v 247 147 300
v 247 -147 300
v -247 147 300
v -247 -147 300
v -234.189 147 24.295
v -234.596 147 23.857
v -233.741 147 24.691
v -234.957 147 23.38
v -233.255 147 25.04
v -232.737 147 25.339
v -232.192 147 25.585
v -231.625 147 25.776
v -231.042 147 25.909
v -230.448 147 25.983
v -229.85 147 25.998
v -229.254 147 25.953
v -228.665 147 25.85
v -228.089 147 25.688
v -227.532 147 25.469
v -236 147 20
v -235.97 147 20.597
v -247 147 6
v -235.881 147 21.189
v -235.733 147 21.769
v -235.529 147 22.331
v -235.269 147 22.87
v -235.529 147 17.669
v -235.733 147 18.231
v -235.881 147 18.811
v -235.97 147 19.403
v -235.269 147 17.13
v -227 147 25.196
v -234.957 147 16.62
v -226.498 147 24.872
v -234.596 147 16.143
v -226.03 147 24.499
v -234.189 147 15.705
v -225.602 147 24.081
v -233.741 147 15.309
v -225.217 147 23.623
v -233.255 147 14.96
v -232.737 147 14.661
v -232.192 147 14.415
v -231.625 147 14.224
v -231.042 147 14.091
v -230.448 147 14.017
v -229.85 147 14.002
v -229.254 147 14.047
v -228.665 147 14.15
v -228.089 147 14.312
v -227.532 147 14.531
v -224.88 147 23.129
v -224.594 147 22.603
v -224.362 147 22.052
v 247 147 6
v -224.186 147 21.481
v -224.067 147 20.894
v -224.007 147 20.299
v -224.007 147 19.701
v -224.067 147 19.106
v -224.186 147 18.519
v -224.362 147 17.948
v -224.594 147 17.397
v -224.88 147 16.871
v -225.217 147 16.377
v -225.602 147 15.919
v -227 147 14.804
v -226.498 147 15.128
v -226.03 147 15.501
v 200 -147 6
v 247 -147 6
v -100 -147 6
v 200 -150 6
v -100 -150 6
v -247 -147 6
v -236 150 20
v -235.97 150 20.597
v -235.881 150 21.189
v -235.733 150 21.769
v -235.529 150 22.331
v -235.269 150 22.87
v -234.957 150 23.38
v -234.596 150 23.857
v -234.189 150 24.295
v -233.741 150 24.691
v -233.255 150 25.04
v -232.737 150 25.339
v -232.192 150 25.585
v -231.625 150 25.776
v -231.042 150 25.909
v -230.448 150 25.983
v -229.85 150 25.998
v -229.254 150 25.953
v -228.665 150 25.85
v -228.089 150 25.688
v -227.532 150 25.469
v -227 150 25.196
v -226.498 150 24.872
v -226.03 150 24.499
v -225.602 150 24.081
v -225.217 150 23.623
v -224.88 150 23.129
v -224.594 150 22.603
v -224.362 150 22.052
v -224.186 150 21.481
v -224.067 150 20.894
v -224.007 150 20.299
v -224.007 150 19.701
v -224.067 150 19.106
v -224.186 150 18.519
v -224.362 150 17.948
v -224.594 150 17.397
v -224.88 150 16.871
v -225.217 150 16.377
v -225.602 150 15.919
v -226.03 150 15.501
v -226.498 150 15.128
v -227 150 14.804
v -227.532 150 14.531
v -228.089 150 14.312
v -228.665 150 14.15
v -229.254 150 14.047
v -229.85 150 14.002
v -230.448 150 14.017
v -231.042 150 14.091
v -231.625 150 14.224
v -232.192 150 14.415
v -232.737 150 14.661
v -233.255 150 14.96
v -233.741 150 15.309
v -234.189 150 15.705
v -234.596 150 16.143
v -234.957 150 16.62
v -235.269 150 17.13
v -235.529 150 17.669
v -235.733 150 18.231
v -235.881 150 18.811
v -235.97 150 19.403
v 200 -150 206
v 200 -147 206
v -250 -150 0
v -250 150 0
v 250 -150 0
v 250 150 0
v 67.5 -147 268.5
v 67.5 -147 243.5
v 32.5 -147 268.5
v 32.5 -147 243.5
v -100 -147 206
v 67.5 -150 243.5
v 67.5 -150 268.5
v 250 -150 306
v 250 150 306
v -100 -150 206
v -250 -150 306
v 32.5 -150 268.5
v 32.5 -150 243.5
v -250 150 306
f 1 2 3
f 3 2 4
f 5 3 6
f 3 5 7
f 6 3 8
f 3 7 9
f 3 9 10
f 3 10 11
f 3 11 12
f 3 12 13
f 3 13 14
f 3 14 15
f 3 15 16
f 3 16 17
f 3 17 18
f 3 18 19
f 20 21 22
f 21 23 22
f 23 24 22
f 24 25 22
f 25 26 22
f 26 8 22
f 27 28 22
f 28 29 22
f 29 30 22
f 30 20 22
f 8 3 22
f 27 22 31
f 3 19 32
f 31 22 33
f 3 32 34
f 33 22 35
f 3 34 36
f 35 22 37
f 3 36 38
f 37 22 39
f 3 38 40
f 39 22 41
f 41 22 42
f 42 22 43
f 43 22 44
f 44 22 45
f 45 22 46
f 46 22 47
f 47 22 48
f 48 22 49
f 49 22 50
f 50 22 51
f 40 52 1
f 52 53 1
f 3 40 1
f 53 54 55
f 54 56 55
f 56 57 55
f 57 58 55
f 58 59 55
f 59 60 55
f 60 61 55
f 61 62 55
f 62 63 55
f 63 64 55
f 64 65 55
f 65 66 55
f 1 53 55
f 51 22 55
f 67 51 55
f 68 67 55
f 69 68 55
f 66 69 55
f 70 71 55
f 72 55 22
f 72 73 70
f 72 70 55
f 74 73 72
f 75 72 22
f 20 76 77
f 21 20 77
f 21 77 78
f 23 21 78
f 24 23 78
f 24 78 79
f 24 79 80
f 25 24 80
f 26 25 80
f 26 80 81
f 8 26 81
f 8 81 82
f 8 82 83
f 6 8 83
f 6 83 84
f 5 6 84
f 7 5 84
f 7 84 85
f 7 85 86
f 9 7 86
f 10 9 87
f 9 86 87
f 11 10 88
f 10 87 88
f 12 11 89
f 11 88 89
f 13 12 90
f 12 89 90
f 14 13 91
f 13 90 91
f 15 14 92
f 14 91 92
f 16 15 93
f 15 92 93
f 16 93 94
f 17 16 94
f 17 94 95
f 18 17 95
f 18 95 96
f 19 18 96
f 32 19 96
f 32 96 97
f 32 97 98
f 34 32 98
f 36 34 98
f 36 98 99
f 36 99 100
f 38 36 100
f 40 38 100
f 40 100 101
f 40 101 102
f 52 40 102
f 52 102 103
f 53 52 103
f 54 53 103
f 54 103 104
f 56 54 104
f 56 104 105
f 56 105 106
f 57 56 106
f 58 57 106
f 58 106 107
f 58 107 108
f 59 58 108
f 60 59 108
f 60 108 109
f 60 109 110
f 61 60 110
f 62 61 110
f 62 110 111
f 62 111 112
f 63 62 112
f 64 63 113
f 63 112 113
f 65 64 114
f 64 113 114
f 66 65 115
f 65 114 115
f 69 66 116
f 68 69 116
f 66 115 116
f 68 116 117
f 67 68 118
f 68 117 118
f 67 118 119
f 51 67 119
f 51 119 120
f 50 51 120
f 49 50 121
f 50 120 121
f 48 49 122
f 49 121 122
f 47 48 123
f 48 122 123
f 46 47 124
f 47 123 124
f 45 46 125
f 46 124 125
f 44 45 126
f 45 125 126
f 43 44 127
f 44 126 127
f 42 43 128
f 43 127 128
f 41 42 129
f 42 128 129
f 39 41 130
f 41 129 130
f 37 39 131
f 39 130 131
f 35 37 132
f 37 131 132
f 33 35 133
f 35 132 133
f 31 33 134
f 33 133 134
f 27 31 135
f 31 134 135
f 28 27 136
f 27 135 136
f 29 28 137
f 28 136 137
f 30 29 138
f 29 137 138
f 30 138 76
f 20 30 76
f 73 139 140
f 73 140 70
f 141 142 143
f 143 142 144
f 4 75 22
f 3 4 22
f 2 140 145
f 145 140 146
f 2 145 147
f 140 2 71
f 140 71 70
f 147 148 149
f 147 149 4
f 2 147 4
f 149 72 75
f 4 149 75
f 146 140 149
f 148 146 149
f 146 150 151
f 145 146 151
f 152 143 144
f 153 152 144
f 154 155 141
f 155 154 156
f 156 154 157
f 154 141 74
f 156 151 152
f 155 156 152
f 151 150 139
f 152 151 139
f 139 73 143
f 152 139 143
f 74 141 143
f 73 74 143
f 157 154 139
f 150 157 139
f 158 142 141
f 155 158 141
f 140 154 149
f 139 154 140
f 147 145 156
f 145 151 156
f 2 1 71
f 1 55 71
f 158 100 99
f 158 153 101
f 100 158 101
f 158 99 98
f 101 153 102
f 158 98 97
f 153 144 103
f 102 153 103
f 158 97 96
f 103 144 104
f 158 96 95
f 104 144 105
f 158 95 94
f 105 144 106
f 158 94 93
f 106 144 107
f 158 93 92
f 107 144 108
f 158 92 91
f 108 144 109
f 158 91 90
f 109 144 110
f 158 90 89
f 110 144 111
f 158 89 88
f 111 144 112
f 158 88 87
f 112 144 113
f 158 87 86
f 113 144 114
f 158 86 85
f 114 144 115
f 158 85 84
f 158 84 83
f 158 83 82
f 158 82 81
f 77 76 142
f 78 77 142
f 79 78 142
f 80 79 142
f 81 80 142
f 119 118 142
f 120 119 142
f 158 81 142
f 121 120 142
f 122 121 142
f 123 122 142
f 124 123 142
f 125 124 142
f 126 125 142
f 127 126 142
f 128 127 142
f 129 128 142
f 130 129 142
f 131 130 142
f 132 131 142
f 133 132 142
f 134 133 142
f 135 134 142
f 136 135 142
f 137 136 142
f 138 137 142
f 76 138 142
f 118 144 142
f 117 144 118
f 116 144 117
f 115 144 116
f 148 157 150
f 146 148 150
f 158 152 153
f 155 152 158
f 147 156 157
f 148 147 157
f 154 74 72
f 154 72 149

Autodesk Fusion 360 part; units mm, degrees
sketch "Onderkant" plane through (0, 0, 0) normal (0, 0, 1) x (1, 0, 0)
  line L0 (250, 150) -> (-250, 150)
  line L1 (-250, 150) -> (-250, -150)
  line L2 (-250, -150) -> (250, -150)
  line L3 (250, -150) -> (250, 150)
  line L4 (250, 150) -> (-250, -150) construction
  line L5 (-250, 150) -> (250, -150) construction
  dimension "d29" = 500
  dimension "d30" = 300
extrude "Extrude7" add sketch "Onderkant" along normal blind 6
sketch "Zijkanten" plane through (0, 0, 6) normal (0, 0, 1) x (-1, 0, 0)
  line L0 (-250, 150) -> (-250, -150)
  line L1 (-250, -150) -> (250, -150)
  line L2 (250, -150) -> (250, 150)
  line L3 (250, 150) -> (-250, 150)
  line L4 (-247, 147) -> (247, 147)
  line L5 (247, 147) -> (247, -147)
  line L6 (247, -147) -> (-247, -147)
  line L7 (-247, -147) -> (-247, 147)
  line L8 (-247, 147) -> (247, -147) construction
  line L9 (247, 147) -> (-247, -147) construction
  dimension "d33" = 494
  dimension "d34" = 294
extrude "Extrude8" add sketch "Zijkanten" along normal blind 300
sketch "Bovenkant" plane through (0, 0, 306) normal (0, 0, 1) x (-1, 0, 0)
  line L0 (247, -147) -> (-247, -147)
  line L1 (-247, -147) -> (-247, 147)
  line L2 (-247, 147) -> (247, 147)
  line L3 (247, 147) -> (247, -147)
  line L4 (250, 150) -> (-250, 150)
  line L5 (-250, 150) -> (-250, -150)
  line L6 (-250, -150) -> (250, -150)
  line L7 (250, -150) -> (250, 150)
  line L8 (-250, 150) -> (250, 150)
  line L9 (250, 150) -> (250, -150)
  line L10 (250, -150) -> (-250, -150)
  line L11 (-250, -150) -> (-250, 150)
  line L12 (-250, 150) -> (250, -150) construction
  line L13 (250, 150) -> (-250, -150) construction
  dimension "d37" = 500
  dimension "d38" = 300
extrude "Extrude9" add sketch "Bovenkant" against normal blind 6 contours L0 L1 L2 L3
sketch "Deur" plane through (0, -150, 0) normal (0, -1, 0) x (1, 0, 0)
  line L0 (-250, 0) -> (250, 0)
  line L1 (250, 0) -> (250, 306)
  line L2 (250, 306) -> (-250, 306)
  line L3 (-250, 306) -> (-250, 0)
  line L4 (200, 6) -> (-100, 6)
  line L5 (-100, 6) -> (-100, 206)
  line L6 (-100, 206) -> (200, 206)
  line L7 (200, 206) -> (200, 6)
  dimension "d42" = 300
  dimension "d43" = 200
extrude "Extrude10" cut sketch "Deur" against normal blind 6 contours L4 L5 L6 L7
sketch "Gat kabel" plane through (0, 150, 0) normal (0, 1, 0) x (-1, 0, 0)
  line L0 (-250, 0) -> (250, 0)
  line L1 (250, 0) -> (250, 306)
  line L2 (250, 306) -> (-250, 306)
  line L3 (-250, 306) -> (-250, 0)
  line L4 (240, 10) -> (220, 10)
  line L5 (220, 10) -> (220, 30)
  line L6 (220, 30) -> (240, 30)
  line L7 (240, 30) -> (240, 10)
  circle A0 centre (230, 20) radius 6
  dimension "d46" = 12
extrude "Extrude11" cut sketch "Gat kabel" against normal blind 6 contours A0
sketch "Gat scanner" plane through (0, -150, 0) normal (0, -1, 0) x (1, 0, 0)
  line L0 (-100, 6) -> (-100, 206)
  line L1 (-100, 206) -> (200, 206)
  line L2 (200, 206) -> (200, 6)
  line L3 (200, 6) -> (-100, 6)
  line L4 (-250, 0) -> (250, 0)
  line L5 (250, 0) -> (250, 306)
  line L6 (250, 306) -> (-250, 306)
  line L7 (-250, 306) -> (-250, 0)
  line L8 (67.5, 268.5) -> (32.5, 268.5)
  line L9 (32.5, 268.5) -> (32.5, 243.5)
  line L10 (32.5, 243.5) -> (67.5, 243.5)
  line L11 (67.5, 243.5) -> (67.5, 268.5)
  line L12 (67.5, 268.5) -> (32.5, 243.5) construction
  line L13 (32.5, 268.5) -> (67.5, 243.5) construction
  point P0 (50, 256)
  dimension "d51" = 35
  dimension "d52" = 25
extrude "Extrude12" cut sketch "Gat scanner" against normal blind 6 contours L8 L9 L10 L11
equation "lengte = 500 mm"
equation "breedte = 300 mm"
equation "hoogte = 300 mm"
equation "dikte_plaat = 6 mm"
equation "breedte_deur = 300 mm"
equation "hoogte_deur = 200 mm"
equation "d29 = lengte"
equation "d30 = breedte"
equation "d31 = dikte_plaat"
equation "d33 = lengte - dikte_plaat"
equation "d34 = breedte - dikte_plaat"
equation "d35 = hoogte"
equation "d37 = lengte"
equation "d38 = breedte"
equation "d39 = -dikte_plaat"
equation "d42 = breedte_deur"
equation "d43 = hoogte_deur"
equation "d44 = -dikte_plaat"
equation "d47 = -dikte_plaat"
equation "breedte_scanner = 35 mm"
equation "hoogte_scanner = 25 mm"
equation "d51 = breedte_scanner"
equation "d52 = hoogte_scanner"
equation "d53 = -dikte_plaat"
